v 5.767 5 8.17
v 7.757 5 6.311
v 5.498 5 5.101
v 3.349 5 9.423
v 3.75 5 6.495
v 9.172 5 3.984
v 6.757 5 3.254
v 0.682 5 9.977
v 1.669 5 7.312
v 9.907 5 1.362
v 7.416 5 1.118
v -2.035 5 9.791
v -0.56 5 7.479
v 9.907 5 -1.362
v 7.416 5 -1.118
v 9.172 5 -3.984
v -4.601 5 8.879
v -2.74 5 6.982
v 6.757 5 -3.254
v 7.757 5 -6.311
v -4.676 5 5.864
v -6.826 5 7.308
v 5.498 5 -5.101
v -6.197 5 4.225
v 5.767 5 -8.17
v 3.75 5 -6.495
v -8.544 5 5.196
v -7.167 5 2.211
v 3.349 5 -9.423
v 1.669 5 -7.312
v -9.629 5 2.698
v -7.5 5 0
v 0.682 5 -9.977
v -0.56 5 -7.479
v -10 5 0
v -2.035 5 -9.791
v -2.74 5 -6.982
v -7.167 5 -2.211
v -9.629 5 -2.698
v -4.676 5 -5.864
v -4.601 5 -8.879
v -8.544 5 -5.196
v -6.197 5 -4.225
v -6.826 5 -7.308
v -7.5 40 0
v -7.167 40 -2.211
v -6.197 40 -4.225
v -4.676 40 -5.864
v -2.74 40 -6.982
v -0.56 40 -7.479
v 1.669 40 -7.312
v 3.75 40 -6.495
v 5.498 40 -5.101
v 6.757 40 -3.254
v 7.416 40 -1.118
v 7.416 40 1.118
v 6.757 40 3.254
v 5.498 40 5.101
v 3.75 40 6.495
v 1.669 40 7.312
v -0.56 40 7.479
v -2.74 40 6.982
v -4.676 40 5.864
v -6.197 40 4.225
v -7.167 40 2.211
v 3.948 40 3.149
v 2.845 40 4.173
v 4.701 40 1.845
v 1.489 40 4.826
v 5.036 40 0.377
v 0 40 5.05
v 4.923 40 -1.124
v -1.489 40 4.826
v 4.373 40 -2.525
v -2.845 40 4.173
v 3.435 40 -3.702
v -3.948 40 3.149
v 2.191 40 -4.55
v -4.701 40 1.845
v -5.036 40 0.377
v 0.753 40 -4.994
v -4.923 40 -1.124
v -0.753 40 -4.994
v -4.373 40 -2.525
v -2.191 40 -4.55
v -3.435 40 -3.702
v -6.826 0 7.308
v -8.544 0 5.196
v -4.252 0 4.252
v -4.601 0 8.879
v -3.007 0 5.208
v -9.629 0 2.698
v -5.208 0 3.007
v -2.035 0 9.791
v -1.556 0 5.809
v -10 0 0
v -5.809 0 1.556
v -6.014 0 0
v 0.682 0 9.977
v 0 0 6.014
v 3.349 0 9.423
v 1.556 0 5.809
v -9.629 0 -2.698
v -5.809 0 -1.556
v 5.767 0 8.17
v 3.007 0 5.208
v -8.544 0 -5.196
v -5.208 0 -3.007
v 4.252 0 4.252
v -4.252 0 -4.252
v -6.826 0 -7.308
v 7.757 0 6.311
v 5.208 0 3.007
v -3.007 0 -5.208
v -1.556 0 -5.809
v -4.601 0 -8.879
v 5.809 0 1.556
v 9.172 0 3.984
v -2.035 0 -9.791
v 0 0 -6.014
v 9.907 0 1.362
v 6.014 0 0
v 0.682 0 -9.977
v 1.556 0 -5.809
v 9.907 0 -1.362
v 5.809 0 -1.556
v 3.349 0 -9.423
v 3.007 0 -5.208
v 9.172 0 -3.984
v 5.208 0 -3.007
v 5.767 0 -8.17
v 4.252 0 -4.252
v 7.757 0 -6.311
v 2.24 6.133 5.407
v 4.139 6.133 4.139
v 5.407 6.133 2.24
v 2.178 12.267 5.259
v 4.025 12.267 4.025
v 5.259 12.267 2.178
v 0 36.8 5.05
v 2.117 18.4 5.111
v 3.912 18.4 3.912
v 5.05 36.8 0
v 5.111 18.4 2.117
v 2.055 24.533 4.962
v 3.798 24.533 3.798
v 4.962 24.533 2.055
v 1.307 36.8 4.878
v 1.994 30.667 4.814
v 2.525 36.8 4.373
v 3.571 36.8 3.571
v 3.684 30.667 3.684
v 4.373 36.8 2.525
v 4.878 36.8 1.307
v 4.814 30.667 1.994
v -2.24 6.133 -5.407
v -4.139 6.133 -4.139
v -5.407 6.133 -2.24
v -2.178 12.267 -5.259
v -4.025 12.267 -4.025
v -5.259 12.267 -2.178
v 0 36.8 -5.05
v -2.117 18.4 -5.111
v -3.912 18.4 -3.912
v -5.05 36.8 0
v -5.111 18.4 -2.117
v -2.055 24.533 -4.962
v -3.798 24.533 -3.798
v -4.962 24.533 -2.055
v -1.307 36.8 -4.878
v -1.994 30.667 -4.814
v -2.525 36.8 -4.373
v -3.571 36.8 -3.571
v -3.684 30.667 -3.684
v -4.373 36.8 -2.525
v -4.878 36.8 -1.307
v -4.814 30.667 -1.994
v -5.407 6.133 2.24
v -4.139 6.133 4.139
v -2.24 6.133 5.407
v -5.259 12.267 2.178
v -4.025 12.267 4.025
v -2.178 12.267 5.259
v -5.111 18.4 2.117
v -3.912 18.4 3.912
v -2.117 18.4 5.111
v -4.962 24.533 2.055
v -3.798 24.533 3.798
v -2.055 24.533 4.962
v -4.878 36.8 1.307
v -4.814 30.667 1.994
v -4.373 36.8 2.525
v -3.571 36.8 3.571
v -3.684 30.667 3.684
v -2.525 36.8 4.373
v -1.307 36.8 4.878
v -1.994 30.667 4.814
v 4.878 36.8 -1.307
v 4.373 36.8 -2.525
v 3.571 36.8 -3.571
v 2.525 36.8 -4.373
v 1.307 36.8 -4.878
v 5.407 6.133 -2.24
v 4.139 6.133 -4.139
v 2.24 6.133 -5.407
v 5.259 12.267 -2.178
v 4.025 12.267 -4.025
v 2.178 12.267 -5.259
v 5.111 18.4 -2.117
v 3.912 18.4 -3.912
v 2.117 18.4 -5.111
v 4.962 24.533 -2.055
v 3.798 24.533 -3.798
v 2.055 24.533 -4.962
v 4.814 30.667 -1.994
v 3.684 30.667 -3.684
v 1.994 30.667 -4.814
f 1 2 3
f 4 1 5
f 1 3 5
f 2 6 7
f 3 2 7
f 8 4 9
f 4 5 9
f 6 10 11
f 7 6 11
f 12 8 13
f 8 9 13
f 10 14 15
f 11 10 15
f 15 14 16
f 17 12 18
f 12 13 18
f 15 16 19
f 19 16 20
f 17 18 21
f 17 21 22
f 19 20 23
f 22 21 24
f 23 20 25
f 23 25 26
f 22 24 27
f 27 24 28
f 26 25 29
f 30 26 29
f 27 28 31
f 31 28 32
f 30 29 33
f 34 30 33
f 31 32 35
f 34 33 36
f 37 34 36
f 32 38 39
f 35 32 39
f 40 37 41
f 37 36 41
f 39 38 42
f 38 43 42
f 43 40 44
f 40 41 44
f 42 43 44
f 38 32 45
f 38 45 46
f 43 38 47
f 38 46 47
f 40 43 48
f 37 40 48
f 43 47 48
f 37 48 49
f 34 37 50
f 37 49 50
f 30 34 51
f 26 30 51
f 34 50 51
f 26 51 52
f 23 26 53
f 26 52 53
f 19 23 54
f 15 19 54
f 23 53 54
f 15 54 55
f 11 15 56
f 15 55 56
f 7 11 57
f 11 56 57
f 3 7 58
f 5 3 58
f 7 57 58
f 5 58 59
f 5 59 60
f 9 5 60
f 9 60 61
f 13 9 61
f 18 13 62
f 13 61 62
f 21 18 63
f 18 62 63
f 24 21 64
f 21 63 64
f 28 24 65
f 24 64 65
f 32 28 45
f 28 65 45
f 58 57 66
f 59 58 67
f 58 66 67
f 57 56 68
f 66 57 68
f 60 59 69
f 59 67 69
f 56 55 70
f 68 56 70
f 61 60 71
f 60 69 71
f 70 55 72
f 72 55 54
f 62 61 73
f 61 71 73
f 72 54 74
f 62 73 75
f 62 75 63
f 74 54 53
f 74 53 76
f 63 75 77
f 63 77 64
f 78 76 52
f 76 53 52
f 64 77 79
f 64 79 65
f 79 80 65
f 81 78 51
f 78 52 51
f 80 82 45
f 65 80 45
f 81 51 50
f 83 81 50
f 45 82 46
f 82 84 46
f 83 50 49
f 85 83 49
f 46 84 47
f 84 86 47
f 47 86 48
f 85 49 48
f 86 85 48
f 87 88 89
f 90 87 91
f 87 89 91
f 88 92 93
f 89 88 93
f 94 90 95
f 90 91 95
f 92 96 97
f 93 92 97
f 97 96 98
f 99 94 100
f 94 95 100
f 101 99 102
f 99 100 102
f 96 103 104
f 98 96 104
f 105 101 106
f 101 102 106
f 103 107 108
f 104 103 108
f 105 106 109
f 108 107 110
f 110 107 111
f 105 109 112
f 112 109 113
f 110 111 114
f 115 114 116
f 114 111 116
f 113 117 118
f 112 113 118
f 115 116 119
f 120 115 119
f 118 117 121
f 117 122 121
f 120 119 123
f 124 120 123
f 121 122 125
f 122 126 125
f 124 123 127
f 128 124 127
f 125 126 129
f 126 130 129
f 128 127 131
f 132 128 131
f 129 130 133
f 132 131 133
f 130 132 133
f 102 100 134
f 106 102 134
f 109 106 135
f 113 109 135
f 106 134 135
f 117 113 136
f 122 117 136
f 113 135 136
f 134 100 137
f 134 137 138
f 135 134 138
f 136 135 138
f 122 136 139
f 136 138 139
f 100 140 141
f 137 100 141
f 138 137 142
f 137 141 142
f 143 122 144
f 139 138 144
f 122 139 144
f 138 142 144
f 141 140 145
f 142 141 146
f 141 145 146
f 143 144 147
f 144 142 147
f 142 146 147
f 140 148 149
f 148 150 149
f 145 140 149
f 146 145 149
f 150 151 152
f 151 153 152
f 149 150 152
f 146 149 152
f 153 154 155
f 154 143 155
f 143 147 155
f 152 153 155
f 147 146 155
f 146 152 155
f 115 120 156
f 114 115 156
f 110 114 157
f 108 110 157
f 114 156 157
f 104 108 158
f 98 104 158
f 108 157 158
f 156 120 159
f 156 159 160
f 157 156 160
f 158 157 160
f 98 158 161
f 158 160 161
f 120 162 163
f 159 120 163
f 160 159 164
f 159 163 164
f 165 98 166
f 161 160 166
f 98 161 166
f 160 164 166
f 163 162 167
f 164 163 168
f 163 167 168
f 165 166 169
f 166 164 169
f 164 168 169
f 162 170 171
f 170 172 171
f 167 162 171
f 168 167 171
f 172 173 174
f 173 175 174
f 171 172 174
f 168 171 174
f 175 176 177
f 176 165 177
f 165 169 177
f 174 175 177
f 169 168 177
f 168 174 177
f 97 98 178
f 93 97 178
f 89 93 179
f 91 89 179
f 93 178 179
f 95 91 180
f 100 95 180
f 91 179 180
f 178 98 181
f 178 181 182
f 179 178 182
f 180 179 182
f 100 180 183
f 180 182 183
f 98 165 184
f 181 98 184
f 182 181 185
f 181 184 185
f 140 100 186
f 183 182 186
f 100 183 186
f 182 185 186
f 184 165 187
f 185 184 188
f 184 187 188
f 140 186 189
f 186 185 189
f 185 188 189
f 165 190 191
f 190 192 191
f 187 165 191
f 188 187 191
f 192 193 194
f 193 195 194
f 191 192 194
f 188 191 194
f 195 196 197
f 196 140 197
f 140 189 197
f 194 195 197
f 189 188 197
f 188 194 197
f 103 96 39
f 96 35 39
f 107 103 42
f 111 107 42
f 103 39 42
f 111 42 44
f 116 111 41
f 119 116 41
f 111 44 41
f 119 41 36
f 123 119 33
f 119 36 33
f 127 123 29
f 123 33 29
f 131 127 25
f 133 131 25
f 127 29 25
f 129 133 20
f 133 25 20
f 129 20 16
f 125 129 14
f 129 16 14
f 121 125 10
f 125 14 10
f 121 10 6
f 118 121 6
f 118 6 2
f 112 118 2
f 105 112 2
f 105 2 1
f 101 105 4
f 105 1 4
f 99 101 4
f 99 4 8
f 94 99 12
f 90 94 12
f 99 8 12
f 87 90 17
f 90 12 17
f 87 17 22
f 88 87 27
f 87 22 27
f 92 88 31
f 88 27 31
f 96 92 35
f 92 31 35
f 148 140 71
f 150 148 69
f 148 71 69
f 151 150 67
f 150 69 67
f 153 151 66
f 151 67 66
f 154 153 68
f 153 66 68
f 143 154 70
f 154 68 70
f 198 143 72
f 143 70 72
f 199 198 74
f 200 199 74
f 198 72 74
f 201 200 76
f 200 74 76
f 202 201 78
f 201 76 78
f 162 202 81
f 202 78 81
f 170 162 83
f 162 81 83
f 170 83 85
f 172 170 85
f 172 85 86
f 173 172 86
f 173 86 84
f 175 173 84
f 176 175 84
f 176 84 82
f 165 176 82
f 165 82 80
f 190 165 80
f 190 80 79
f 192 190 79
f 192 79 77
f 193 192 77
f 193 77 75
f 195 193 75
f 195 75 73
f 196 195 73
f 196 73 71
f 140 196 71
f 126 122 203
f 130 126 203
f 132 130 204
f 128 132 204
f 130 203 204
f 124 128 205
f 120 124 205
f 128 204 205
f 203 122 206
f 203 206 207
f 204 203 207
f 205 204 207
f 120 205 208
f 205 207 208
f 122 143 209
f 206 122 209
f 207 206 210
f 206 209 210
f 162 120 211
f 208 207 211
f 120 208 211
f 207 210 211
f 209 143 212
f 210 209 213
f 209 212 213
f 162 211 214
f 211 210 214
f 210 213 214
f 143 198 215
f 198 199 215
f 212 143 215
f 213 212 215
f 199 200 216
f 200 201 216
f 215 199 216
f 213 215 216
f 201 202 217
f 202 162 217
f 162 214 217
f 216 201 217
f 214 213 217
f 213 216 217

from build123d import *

# Parameters (mm, degrees)
CUT_EXTRUDE1_REACH = 44.426
SKETCH2_R          = 5.05


with BuildPart() as part:
    # Sketch1 → Revolve1 (revolve)
    with BuildSketch(Plane.XY, mode=Mode.PRIVATE) as revolve1_sk:
        Polygon((0, 0), (10, 0), (10, 5), (7.5, 5), (7.5, 40), (0, 40), align=None)
    revolve(revolve1_sk.sketch.rotate(Axis((0, 45, 0), (0, -1, 0)), 180), axis=Axis((0, 45, 0), (0, -1, 0)))

    # Sketch2 → Cut-Extrude1 (cut, up to next)
    with BuildSketch(Plane(origin=(0, 40, 0), x_dir=(1, 0, 0), z_dir=(0, 1, 0)), mode=Mode.PRIVATE) as cut_extrude1_sk1:
        with Locations(Location((0, 0, 0), (0, 0, 270))):
            Circle(SKETCH2_R)
    cut_extrude1_tool1 = extrude(cut_extrude1_sk1.sketch, amount=-CUT_EXTRUDE1_REACH, mode=Mode.PRIVATE) & part.part
    add(cut_extrude1_tool1.solids().sort_by_distance((0, 40, 0))[0], mode=Mode.SUBTRACT)

    # Cut-Sweep1: sweep along a curve in space
    with BuildLine() as cut_sweep1_path:
        ThreePointArc((0, 40, 5.05), (3.570889245, 40, 3.570889245), (5.05, 40, 0))
        ThreePointArc((5.05, 40, 0), (3.570889245, 40, -3.570889245), (0, 40, -5.05))
        ThreePointArc((0, 40, -5.05), (-3.570889245, 40, -3.570889245), (-5.05, 40, 0))
        ThreePointArc((-5.05, 40, 0), (-3.570889245, 40, 3.570889245), (0, 40, 5.05))
    # Sketch3 → Cut-Sweep1 (sweep, cut)
    with BuildSketch(Plane.XY):
        Polygon((5.05, 36.8), (6.013641914, 0), (5.05, 0), align=None)
    sweep(path=cut_sweep1_path.line, mode=Mode.SUBTRACT)


solid = part.part
